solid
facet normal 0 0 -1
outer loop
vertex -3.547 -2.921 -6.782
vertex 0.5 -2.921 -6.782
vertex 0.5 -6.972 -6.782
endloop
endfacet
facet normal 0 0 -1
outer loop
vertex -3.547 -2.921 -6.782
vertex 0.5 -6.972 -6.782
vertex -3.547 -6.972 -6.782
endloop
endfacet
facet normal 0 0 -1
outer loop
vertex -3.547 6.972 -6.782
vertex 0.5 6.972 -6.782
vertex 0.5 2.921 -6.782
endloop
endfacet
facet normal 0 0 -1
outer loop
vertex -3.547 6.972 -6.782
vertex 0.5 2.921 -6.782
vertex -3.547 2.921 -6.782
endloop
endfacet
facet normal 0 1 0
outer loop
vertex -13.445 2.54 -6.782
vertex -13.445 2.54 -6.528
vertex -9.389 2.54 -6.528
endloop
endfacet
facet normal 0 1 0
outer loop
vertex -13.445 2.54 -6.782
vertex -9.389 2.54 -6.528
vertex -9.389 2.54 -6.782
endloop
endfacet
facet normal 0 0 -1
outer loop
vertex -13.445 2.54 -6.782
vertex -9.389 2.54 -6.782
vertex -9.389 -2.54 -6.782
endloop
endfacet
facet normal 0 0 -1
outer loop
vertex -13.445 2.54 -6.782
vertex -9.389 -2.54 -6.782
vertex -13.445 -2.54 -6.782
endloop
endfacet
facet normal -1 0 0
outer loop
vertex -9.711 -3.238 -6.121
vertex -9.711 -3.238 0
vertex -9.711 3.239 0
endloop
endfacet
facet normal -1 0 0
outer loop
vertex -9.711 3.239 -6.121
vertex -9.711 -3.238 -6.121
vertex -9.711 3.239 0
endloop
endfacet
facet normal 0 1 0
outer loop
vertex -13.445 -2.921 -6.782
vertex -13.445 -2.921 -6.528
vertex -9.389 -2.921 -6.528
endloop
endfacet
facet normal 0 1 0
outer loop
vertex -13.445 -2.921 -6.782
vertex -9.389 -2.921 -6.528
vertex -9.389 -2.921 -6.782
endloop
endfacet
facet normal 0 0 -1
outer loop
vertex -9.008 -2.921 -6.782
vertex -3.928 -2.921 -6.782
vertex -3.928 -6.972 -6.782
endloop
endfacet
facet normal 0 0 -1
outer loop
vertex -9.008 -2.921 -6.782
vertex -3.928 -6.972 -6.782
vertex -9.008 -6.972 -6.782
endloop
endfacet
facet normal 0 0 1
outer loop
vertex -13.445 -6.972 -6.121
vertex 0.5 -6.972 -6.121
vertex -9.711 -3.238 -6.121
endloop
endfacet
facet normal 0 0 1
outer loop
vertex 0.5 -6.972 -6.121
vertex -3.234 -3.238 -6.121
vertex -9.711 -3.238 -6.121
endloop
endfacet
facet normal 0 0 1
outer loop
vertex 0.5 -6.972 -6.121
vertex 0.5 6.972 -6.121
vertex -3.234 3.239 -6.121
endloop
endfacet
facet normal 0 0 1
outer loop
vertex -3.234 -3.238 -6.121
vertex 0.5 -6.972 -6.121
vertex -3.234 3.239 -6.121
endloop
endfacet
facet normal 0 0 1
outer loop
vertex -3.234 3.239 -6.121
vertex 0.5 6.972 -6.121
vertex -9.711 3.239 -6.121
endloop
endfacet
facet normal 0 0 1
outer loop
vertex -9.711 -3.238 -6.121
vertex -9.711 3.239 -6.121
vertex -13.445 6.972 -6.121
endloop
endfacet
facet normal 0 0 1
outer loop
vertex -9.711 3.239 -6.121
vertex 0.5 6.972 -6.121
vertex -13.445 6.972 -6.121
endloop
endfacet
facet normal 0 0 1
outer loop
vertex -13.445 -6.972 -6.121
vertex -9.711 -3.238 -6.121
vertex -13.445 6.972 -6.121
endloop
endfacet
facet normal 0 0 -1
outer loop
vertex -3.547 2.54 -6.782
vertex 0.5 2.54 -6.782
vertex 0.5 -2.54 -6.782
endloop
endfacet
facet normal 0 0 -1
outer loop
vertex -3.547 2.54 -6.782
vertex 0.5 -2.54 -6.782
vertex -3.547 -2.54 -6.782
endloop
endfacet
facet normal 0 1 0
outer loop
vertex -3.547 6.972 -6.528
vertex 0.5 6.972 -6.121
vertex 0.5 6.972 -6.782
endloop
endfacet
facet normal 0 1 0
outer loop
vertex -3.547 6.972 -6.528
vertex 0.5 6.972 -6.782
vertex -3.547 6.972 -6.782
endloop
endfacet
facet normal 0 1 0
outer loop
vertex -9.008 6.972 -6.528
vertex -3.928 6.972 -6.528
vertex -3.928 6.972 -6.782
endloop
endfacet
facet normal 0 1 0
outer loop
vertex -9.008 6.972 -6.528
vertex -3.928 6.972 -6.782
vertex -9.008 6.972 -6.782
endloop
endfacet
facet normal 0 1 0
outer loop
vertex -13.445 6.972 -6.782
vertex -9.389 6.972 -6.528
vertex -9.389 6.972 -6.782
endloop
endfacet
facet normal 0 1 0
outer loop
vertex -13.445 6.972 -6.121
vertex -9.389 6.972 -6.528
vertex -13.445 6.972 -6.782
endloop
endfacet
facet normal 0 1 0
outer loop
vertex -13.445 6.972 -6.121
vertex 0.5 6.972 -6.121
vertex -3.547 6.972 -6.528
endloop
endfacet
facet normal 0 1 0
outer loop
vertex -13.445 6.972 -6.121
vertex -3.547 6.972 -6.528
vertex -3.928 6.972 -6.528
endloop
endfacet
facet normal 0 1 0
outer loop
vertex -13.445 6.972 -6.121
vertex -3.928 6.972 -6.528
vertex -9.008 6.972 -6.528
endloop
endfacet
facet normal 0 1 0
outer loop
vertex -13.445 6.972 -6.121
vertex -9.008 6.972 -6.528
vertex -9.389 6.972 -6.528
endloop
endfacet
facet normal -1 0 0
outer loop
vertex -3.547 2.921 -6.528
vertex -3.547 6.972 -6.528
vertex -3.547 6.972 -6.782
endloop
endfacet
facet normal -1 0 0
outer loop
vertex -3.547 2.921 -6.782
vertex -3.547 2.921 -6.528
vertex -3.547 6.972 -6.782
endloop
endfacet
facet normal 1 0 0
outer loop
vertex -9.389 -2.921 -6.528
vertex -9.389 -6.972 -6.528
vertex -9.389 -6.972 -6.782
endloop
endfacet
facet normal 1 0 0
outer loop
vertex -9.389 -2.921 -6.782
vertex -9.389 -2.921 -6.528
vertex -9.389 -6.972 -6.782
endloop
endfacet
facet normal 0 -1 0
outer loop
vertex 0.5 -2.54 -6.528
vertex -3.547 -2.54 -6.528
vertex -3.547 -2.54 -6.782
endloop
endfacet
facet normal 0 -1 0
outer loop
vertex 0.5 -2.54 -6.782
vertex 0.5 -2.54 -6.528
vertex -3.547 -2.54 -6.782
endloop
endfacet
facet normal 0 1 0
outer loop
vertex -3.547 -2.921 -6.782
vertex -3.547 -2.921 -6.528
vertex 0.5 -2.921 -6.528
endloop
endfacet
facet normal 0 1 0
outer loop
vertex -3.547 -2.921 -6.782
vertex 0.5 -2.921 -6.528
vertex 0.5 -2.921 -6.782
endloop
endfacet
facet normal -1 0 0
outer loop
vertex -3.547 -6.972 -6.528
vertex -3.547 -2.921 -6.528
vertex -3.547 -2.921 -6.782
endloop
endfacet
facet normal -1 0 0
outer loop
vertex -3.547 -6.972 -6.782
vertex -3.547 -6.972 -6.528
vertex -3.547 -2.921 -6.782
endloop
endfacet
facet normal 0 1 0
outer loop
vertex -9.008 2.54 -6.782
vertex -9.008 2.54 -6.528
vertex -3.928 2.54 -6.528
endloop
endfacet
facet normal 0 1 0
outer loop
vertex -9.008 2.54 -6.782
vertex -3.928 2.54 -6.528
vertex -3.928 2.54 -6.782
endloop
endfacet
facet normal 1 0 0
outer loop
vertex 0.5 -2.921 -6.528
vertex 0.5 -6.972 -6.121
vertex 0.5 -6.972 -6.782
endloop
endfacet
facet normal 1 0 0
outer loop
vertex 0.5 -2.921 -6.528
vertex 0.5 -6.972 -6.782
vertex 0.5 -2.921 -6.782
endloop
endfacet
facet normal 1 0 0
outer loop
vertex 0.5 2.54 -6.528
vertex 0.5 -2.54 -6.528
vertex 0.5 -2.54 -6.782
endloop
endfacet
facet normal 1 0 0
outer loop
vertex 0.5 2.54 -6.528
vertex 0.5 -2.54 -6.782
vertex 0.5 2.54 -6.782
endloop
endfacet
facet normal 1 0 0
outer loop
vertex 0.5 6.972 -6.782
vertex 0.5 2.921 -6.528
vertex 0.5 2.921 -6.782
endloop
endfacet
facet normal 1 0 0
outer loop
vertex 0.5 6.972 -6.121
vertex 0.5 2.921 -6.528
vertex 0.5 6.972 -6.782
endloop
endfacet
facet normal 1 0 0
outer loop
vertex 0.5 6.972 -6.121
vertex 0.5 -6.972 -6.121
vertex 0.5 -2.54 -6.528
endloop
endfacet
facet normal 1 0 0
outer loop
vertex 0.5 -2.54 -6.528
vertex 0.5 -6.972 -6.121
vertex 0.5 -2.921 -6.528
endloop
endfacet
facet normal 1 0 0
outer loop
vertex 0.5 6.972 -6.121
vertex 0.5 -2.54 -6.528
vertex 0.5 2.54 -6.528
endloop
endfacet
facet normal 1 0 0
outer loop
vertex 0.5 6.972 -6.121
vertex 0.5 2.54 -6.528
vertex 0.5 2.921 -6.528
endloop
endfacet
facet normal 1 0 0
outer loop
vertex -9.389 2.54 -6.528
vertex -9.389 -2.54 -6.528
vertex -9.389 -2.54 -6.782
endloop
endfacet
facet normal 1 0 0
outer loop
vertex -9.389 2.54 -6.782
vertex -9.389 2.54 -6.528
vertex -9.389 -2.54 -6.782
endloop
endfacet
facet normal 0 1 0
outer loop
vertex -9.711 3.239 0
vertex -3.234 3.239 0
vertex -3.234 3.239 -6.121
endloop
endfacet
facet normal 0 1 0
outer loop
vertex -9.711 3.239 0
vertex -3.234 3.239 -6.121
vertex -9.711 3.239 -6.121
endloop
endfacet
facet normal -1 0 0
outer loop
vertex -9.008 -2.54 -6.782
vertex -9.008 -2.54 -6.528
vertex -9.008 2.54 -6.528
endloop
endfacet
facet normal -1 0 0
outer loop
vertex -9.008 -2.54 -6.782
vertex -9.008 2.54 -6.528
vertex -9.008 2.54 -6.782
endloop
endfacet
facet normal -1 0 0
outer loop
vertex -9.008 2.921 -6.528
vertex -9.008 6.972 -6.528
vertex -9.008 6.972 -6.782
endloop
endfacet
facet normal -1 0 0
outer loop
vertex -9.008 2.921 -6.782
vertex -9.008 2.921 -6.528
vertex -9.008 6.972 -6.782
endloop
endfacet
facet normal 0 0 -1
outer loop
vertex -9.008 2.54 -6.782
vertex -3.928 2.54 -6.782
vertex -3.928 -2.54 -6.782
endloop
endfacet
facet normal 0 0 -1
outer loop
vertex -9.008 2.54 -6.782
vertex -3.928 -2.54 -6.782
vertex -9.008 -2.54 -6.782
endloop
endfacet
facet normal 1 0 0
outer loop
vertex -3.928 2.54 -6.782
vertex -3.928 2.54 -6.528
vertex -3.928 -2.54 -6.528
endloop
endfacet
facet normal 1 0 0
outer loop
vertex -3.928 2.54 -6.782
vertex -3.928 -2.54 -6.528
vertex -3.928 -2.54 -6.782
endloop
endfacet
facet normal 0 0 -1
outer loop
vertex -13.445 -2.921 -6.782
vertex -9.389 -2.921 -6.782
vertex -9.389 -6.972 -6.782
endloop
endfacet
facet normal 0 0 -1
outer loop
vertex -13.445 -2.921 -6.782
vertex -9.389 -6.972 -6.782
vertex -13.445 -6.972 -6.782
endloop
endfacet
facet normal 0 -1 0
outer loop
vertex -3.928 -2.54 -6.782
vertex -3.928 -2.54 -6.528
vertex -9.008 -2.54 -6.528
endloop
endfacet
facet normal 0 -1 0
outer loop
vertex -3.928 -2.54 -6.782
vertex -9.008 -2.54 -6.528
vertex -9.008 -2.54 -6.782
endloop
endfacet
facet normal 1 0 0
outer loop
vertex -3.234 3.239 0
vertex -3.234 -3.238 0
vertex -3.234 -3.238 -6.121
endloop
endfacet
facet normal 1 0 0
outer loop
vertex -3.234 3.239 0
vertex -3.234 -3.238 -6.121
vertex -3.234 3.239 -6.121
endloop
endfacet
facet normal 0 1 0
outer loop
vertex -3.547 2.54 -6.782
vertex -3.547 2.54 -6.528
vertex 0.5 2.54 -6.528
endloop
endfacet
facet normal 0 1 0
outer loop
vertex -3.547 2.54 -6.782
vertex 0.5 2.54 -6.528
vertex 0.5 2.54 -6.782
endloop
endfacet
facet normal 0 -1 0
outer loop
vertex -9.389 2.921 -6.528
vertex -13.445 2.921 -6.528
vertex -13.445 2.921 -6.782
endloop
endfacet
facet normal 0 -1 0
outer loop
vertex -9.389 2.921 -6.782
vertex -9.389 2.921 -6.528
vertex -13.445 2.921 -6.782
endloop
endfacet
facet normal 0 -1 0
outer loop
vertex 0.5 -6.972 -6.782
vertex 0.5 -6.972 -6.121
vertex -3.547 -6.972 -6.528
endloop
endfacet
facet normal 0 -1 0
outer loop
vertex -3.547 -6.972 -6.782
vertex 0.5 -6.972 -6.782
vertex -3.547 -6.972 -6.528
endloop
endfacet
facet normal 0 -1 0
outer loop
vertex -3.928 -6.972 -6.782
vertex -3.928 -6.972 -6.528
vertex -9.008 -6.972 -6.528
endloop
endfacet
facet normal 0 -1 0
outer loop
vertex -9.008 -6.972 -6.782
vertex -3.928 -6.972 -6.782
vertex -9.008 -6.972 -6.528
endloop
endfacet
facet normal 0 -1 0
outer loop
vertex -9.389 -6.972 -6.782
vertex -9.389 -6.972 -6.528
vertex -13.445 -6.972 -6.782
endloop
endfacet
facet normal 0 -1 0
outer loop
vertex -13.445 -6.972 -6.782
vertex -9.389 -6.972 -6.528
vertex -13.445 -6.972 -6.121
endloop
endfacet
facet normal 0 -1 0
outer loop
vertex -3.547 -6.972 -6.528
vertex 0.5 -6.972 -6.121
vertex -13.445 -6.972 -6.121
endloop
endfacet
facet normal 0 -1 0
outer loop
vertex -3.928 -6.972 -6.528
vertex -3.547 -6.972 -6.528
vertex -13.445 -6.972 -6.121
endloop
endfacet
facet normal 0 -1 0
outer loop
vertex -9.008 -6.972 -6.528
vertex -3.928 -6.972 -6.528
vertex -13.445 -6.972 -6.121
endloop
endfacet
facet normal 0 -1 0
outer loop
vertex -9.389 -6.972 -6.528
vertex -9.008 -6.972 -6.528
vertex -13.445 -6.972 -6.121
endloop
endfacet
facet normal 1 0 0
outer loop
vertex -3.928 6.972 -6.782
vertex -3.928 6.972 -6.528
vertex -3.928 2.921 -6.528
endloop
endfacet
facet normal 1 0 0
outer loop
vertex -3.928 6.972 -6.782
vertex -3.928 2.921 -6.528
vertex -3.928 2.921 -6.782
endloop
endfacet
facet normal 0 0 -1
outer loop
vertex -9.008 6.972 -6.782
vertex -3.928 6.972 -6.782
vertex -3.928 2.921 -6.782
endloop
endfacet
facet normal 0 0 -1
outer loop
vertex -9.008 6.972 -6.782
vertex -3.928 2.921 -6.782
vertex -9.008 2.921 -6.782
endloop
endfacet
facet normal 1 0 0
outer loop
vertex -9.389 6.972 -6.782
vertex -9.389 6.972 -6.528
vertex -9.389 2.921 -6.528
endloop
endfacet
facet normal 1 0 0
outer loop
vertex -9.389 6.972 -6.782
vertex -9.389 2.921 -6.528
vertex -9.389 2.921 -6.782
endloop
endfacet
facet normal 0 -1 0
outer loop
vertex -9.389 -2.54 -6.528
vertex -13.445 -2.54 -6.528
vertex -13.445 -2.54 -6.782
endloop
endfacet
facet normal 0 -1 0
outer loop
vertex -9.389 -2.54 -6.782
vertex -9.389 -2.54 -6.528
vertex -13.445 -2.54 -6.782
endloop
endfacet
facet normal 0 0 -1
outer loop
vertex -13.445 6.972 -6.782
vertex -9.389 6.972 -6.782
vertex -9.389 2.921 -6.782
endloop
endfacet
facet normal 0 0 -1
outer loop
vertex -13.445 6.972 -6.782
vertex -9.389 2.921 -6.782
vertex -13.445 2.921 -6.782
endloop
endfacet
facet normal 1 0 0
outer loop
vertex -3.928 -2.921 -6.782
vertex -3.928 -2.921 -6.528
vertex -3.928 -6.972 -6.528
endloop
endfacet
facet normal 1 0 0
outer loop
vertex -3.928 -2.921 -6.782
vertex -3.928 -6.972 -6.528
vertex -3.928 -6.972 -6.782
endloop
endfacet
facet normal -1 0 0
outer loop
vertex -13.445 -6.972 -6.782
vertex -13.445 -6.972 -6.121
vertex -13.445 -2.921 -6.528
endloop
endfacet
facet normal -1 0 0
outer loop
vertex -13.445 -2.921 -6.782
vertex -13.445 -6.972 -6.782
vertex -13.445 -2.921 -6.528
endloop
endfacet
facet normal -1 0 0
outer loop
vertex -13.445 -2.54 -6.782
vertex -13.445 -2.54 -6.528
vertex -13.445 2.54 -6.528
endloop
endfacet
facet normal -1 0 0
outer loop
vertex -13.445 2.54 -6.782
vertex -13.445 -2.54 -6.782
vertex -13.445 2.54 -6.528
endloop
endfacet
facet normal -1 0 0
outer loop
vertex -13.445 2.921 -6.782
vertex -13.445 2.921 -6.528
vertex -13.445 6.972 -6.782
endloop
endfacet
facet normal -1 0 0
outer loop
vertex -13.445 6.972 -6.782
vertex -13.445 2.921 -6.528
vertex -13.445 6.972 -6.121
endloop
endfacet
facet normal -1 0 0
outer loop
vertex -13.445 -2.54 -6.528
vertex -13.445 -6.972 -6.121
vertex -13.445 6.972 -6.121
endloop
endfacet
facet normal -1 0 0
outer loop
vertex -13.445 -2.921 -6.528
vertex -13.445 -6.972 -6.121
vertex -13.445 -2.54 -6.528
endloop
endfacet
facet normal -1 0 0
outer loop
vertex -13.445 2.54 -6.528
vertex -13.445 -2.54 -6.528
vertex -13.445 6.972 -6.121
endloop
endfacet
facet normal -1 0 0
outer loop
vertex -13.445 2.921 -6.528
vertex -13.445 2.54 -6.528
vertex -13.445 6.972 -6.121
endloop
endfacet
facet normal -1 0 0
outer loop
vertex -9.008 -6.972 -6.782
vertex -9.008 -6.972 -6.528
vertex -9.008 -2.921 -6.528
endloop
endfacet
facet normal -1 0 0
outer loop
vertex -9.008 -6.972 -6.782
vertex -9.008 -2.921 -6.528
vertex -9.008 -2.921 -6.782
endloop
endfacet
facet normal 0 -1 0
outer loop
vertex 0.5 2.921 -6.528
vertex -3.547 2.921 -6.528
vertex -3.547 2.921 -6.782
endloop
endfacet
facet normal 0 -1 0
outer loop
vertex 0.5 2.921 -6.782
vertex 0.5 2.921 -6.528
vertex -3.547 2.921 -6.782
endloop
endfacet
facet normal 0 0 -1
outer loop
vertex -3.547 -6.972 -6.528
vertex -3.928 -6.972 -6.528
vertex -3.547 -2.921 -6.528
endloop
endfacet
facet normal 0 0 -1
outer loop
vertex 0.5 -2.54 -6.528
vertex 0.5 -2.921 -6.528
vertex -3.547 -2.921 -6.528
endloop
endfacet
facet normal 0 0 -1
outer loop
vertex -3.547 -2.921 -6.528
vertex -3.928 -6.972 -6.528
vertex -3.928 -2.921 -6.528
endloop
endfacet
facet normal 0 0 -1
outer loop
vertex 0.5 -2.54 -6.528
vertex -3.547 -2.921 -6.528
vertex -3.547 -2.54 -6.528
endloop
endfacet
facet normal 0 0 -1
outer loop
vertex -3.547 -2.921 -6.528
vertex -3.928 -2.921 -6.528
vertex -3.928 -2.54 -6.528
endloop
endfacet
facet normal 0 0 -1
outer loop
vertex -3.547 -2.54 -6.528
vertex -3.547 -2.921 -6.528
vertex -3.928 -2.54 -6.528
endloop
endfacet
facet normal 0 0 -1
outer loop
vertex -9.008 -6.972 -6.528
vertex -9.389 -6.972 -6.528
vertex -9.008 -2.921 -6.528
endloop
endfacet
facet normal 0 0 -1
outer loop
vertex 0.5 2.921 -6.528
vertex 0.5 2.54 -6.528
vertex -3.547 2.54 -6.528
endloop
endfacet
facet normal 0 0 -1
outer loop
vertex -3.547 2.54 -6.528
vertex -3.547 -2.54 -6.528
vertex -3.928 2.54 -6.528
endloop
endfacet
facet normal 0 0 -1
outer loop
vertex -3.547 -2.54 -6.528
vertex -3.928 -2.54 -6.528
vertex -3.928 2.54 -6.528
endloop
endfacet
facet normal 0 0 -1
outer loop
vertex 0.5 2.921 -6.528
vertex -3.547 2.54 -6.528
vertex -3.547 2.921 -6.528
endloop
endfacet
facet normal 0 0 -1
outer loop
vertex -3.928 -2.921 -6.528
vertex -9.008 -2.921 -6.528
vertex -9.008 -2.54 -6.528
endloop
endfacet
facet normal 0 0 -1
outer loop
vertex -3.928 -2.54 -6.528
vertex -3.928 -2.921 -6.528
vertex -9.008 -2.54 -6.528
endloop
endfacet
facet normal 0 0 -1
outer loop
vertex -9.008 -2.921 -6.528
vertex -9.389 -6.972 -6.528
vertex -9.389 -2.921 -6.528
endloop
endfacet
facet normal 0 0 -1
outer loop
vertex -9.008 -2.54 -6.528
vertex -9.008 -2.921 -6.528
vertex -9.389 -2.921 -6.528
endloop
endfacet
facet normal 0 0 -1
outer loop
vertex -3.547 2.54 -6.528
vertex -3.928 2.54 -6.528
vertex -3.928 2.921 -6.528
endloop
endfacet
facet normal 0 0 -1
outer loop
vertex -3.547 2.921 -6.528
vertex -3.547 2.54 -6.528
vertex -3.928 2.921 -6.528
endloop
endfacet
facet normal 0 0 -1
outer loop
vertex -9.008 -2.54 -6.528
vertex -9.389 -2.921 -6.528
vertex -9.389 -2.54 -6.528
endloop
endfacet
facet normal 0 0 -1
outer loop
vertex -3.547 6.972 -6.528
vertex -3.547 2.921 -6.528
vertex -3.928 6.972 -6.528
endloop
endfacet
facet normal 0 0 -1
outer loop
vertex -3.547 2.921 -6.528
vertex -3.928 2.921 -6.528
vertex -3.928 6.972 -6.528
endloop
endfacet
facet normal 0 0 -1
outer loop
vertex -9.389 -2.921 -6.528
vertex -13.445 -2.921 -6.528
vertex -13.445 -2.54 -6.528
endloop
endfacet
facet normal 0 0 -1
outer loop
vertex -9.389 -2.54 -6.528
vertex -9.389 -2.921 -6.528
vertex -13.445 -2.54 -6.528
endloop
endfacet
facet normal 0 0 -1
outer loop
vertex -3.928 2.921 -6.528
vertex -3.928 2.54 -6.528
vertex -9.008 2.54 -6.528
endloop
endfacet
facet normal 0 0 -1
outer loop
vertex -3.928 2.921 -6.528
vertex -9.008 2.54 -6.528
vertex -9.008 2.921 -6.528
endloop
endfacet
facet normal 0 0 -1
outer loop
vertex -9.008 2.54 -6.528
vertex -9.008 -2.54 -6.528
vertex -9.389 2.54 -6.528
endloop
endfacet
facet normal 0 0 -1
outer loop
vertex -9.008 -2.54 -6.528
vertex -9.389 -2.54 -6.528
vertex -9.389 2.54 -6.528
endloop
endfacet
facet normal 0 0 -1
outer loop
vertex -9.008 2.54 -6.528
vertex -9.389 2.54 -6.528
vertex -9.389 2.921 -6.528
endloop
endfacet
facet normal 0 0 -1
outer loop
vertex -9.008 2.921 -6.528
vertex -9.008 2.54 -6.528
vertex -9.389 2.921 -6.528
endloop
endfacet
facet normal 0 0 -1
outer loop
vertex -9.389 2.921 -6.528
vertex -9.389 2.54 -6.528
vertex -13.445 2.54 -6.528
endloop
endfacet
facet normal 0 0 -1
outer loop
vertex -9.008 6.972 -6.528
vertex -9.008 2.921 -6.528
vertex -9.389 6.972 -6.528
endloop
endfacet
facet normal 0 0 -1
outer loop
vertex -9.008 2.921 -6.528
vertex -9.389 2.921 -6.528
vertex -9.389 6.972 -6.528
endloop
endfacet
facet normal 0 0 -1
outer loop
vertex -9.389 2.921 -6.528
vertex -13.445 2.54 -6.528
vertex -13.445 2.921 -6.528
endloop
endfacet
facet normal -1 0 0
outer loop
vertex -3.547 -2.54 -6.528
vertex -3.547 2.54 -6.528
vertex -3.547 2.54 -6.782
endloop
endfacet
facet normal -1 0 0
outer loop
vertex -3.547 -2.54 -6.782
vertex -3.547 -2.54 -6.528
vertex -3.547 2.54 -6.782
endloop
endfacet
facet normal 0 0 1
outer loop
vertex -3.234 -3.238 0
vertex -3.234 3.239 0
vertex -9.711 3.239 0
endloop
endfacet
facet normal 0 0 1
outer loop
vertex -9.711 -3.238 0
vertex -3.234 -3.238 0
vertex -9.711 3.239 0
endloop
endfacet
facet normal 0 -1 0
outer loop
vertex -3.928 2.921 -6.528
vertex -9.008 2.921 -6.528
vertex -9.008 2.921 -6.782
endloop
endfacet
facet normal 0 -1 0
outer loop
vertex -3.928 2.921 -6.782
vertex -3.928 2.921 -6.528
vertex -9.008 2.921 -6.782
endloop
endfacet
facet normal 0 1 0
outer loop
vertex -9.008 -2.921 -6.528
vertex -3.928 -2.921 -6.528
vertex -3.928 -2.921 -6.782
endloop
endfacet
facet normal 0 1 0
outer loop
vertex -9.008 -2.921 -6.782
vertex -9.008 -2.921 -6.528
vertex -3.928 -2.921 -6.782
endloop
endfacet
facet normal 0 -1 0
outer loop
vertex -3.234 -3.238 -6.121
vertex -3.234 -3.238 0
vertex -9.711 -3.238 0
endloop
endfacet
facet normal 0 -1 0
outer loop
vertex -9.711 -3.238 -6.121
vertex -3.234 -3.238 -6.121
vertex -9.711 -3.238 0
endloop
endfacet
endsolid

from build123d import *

# Parameters (mm, degrees)
F0_W     = 6.477
F0_H     = 6.477
F1_DEPTH = 6.477
F4_START = 6.1214
F3_W     = 13.9445995965
F3_H     = 13.9445995965
F4_DEPTH = 0.6604
F5_W     = 0.381
F5_H     = 0.8794372982
F6_DEPTH = 12.7
F7_W     = 0.381
F7_H     = 1.3506091439
F8_DEPTH = 12.7
F9_ANGLE = 180


with BuildPart() as f1:
    # F0 (on Top) → F1 (new body)
    with BuildSketch(Plane.XY):
        with Locations((-9.8426504992, 11.6166997607)):
            Rectangle(F0_W, F0_H)
    extrude(amount=F1_DEPTH)


with BuildPart() as f1_1:
    # F2: moved
    add(f1.part.moved(Location((9.84707, -11.61667, 0))))

    # F3 (on Top) → F4 (join)
    with BuildSketch(Plane.XY.offset(F4_START)):
        with Locations((0.0044195008, 2.97607e-05)):
            Rectangle(F3_W, F3_H)
    extrude(amount=F4_DEPTH)

    # F5 (on Front) → F6 (cut, symmetric)
    with BuildSketch(Plane.XZ):
        with Locations((-2.7305, 6.9675186491)):
            Rectangle(F5_W, F5_H)
        with Locations((2.7305, 6.9675186491)):
            Rectangle(F5_W, F5_H)
    extrude(amount=F6_DEPTH, both=True, mode=Mode.SUBTRACT)

    # F7 (on Right) → F8 (cut, symmetric)
    with BuildSketch(Plane.YZ):
        with Locations((-2.7305, 7.203104572)):
            Rectangle(F7_W, F7_H)
        with Locations((2.7305, 7.203104572)):
            Rectangle(F7_W, F7_H)
    extrude(amount=F8_DEPTH, both=True, mode=Mode.SUBTRACT)


with BuildPart() as f1_2:
    # F9: moved
    add(f1_1.part.rotate(Axis((-3.2340804992, 2.97607e-05, 0), (0, -1, 0)), F9_ANGLE))


solid = f1_2.part
